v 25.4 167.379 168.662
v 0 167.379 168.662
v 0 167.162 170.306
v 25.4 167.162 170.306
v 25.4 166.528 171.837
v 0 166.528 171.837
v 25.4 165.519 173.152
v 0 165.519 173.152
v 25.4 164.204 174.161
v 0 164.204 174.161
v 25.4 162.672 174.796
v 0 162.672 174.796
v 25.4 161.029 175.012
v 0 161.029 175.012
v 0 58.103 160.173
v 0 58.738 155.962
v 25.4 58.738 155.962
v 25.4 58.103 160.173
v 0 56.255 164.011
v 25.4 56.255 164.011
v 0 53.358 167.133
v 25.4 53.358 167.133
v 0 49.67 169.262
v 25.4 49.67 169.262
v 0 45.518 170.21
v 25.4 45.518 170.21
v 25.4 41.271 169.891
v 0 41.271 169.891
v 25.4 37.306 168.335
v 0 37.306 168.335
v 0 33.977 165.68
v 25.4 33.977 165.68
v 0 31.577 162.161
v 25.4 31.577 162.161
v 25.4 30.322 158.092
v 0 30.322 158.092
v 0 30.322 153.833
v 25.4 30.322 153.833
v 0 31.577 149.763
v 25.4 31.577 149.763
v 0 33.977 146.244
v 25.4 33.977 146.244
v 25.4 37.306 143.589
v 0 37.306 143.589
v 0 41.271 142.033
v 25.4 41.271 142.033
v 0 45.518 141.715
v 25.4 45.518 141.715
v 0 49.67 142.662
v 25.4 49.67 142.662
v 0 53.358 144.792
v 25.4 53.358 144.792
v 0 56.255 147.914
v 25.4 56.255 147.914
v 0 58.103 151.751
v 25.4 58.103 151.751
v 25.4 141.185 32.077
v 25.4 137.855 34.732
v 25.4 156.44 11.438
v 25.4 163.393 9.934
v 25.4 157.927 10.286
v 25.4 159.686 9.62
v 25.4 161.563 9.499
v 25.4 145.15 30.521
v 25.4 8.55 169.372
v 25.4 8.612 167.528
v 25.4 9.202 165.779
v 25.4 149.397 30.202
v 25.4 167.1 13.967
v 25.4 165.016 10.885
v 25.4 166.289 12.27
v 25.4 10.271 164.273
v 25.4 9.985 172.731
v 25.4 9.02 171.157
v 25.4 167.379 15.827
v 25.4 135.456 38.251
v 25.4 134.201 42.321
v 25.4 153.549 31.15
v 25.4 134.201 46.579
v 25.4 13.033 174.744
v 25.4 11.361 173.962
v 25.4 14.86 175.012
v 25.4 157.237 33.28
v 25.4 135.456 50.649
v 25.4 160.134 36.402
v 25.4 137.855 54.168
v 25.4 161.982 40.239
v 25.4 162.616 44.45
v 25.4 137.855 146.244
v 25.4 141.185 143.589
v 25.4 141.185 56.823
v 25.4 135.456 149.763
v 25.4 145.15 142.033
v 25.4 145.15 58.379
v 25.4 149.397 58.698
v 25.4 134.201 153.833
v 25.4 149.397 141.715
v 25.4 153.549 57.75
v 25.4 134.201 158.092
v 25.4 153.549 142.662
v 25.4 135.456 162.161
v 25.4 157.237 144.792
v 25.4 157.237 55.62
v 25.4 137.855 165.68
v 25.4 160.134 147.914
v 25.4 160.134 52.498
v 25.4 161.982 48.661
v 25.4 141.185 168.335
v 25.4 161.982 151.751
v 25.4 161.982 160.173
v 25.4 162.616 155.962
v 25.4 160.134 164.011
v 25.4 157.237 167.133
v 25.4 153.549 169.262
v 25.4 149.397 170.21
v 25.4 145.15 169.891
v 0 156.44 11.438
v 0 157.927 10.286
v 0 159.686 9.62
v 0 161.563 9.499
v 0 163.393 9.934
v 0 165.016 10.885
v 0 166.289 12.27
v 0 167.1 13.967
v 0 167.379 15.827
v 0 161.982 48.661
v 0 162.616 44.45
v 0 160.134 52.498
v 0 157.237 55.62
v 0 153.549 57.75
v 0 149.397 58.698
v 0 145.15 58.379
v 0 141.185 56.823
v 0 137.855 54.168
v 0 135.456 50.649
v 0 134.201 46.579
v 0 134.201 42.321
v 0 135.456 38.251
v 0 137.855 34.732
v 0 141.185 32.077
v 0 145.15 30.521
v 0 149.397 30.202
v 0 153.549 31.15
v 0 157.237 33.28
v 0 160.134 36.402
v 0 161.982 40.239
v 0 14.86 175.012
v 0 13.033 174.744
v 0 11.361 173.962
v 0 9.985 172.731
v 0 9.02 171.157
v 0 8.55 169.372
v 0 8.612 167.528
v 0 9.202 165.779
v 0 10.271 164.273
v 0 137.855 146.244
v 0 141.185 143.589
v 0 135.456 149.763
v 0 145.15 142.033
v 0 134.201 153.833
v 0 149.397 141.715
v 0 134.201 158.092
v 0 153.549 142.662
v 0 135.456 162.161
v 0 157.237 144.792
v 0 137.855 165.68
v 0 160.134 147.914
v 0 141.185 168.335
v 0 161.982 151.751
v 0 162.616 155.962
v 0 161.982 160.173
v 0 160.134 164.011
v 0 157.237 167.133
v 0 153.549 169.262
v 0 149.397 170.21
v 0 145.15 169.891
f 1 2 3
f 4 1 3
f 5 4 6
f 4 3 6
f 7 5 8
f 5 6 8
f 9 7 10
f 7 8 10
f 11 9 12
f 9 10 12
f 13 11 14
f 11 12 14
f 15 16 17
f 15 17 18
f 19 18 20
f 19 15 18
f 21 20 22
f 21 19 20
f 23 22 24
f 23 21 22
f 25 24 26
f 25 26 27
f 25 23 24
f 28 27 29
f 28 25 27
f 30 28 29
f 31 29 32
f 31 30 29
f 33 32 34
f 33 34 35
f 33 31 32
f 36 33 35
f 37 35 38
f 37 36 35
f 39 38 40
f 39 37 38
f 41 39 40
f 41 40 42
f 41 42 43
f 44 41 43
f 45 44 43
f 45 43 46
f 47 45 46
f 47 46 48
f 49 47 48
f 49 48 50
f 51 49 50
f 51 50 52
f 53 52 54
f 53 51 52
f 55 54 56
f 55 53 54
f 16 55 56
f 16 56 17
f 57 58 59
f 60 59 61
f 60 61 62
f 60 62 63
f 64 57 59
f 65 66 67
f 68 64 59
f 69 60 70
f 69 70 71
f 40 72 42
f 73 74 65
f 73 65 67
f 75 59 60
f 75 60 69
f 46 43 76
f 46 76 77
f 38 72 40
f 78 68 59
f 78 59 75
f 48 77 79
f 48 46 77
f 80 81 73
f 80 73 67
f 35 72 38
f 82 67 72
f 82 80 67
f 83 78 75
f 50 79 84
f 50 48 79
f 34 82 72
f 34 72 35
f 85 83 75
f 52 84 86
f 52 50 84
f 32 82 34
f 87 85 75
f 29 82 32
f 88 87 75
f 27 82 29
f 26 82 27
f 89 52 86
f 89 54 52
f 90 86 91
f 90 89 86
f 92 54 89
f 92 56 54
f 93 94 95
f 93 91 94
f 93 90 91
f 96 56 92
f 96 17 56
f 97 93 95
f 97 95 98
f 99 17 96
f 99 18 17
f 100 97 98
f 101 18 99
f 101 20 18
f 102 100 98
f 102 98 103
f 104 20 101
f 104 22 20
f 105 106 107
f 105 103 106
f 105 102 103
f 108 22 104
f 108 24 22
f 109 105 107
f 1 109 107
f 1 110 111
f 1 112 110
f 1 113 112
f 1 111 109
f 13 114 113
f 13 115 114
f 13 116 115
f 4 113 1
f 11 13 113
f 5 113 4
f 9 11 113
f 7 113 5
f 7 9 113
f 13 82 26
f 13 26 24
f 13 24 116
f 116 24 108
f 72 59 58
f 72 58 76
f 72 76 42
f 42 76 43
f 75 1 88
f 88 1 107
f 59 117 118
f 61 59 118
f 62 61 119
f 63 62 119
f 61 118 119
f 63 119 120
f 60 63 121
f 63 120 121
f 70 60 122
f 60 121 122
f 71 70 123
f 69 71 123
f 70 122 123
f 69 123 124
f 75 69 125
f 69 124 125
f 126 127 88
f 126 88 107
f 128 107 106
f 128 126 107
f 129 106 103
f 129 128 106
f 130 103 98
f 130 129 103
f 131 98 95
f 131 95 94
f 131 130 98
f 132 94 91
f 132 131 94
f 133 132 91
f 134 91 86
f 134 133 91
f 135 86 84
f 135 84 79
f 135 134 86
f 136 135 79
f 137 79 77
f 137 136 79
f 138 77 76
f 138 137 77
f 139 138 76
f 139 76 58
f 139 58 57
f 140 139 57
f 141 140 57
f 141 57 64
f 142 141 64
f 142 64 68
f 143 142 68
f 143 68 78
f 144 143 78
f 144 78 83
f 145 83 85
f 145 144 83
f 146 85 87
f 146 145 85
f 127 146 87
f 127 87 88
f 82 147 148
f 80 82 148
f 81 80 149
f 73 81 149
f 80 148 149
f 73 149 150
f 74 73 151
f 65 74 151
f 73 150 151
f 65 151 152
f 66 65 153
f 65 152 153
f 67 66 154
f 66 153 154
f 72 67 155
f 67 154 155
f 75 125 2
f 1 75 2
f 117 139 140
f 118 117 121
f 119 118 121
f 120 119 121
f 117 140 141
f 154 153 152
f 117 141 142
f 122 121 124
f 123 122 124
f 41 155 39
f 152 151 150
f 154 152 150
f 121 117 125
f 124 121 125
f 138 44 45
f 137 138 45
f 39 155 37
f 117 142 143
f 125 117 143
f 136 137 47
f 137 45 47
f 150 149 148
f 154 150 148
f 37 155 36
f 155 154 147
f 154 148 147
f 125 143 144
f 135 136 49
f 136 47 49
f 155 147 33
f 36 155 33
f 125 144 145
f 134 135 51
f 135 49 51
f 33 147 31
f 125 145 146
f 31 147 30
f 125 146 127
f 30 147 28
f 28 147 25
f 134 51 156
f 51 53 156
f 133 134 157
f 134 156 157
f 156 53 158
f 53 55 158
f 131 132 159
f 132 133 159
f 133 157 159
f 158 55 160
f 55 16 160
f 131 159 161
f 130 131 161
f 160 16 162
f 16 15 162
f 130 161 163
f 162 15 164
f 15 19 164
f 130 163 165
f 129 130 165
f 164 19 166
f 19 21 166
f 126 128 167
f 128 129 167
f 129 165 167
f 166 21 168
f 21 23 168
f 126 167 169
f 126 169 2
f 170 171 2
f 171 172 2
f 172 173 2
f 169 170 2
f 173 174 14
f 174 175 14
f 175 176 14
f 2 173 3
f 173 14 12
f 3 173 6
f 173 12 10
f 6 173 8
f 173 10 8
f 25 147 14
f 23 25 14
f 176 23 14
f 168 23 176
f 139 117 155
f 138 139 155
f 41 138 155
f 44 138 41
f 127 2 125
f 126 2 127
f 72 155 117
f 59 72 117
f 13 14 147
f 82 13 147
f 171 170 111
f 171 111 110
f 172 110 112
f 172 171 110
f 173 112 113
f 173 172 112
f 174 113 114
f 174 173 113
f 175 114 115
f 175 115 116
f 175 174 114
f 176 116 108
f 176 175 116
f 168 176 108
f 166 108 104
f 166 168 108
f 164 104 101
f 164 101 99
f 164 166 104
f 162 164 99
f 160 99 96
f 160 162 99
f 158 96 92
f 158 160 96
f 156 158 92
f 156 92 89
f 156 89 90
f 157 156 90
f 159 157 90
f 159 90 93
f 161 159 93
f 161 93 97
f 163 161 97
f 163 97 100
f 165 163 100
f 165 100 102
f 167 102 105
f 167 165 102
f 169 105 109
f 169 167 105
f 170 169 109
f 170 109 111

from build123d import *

# Parameters (mm, degrees)
F0_R     = 14.2875
F1_DEPTH = 25.4


with BuildPart() as f1:
    # F0 (on Right) → F1 (new body)
    with BuildSketch(Plane.YZ):
        with BuildLine():
            Line((161.028833, 175.012099), (14.85964, 175.012099))
            ThreePointArc((14.85964, 175.012099), (9.020452, 171.157371), (10.270549, 164.273164))
            Line((10.270549, 164.273164), (156.439742, 11.437965))
            ThreePointArc((156.439742, 11.437965), (163.393338, 9.933546), (167.378833, 15.8269))
            Line((167.378833, 15.8269), (167.378833, 168.662099))
            ThreePointArc((167.378833, 168.662099), (165.518961, 173.152227), (161.028833, 175.012099))
        make_face()
        with Locations((148.328833, 44.45)):
            Circle(F0_R, mode=Mode.SUBTRACT)
        with Locations((44.45, 155.962099)):
            Circle(F0_R, mode=Mode.SUBTRACT)
        with Locations((148.328833, 155.962099)):
            Circle(F0_R, mode=Mode.SUBTRACT)
    extrude(amount=F1_DEPTH)


solid = f1.part
